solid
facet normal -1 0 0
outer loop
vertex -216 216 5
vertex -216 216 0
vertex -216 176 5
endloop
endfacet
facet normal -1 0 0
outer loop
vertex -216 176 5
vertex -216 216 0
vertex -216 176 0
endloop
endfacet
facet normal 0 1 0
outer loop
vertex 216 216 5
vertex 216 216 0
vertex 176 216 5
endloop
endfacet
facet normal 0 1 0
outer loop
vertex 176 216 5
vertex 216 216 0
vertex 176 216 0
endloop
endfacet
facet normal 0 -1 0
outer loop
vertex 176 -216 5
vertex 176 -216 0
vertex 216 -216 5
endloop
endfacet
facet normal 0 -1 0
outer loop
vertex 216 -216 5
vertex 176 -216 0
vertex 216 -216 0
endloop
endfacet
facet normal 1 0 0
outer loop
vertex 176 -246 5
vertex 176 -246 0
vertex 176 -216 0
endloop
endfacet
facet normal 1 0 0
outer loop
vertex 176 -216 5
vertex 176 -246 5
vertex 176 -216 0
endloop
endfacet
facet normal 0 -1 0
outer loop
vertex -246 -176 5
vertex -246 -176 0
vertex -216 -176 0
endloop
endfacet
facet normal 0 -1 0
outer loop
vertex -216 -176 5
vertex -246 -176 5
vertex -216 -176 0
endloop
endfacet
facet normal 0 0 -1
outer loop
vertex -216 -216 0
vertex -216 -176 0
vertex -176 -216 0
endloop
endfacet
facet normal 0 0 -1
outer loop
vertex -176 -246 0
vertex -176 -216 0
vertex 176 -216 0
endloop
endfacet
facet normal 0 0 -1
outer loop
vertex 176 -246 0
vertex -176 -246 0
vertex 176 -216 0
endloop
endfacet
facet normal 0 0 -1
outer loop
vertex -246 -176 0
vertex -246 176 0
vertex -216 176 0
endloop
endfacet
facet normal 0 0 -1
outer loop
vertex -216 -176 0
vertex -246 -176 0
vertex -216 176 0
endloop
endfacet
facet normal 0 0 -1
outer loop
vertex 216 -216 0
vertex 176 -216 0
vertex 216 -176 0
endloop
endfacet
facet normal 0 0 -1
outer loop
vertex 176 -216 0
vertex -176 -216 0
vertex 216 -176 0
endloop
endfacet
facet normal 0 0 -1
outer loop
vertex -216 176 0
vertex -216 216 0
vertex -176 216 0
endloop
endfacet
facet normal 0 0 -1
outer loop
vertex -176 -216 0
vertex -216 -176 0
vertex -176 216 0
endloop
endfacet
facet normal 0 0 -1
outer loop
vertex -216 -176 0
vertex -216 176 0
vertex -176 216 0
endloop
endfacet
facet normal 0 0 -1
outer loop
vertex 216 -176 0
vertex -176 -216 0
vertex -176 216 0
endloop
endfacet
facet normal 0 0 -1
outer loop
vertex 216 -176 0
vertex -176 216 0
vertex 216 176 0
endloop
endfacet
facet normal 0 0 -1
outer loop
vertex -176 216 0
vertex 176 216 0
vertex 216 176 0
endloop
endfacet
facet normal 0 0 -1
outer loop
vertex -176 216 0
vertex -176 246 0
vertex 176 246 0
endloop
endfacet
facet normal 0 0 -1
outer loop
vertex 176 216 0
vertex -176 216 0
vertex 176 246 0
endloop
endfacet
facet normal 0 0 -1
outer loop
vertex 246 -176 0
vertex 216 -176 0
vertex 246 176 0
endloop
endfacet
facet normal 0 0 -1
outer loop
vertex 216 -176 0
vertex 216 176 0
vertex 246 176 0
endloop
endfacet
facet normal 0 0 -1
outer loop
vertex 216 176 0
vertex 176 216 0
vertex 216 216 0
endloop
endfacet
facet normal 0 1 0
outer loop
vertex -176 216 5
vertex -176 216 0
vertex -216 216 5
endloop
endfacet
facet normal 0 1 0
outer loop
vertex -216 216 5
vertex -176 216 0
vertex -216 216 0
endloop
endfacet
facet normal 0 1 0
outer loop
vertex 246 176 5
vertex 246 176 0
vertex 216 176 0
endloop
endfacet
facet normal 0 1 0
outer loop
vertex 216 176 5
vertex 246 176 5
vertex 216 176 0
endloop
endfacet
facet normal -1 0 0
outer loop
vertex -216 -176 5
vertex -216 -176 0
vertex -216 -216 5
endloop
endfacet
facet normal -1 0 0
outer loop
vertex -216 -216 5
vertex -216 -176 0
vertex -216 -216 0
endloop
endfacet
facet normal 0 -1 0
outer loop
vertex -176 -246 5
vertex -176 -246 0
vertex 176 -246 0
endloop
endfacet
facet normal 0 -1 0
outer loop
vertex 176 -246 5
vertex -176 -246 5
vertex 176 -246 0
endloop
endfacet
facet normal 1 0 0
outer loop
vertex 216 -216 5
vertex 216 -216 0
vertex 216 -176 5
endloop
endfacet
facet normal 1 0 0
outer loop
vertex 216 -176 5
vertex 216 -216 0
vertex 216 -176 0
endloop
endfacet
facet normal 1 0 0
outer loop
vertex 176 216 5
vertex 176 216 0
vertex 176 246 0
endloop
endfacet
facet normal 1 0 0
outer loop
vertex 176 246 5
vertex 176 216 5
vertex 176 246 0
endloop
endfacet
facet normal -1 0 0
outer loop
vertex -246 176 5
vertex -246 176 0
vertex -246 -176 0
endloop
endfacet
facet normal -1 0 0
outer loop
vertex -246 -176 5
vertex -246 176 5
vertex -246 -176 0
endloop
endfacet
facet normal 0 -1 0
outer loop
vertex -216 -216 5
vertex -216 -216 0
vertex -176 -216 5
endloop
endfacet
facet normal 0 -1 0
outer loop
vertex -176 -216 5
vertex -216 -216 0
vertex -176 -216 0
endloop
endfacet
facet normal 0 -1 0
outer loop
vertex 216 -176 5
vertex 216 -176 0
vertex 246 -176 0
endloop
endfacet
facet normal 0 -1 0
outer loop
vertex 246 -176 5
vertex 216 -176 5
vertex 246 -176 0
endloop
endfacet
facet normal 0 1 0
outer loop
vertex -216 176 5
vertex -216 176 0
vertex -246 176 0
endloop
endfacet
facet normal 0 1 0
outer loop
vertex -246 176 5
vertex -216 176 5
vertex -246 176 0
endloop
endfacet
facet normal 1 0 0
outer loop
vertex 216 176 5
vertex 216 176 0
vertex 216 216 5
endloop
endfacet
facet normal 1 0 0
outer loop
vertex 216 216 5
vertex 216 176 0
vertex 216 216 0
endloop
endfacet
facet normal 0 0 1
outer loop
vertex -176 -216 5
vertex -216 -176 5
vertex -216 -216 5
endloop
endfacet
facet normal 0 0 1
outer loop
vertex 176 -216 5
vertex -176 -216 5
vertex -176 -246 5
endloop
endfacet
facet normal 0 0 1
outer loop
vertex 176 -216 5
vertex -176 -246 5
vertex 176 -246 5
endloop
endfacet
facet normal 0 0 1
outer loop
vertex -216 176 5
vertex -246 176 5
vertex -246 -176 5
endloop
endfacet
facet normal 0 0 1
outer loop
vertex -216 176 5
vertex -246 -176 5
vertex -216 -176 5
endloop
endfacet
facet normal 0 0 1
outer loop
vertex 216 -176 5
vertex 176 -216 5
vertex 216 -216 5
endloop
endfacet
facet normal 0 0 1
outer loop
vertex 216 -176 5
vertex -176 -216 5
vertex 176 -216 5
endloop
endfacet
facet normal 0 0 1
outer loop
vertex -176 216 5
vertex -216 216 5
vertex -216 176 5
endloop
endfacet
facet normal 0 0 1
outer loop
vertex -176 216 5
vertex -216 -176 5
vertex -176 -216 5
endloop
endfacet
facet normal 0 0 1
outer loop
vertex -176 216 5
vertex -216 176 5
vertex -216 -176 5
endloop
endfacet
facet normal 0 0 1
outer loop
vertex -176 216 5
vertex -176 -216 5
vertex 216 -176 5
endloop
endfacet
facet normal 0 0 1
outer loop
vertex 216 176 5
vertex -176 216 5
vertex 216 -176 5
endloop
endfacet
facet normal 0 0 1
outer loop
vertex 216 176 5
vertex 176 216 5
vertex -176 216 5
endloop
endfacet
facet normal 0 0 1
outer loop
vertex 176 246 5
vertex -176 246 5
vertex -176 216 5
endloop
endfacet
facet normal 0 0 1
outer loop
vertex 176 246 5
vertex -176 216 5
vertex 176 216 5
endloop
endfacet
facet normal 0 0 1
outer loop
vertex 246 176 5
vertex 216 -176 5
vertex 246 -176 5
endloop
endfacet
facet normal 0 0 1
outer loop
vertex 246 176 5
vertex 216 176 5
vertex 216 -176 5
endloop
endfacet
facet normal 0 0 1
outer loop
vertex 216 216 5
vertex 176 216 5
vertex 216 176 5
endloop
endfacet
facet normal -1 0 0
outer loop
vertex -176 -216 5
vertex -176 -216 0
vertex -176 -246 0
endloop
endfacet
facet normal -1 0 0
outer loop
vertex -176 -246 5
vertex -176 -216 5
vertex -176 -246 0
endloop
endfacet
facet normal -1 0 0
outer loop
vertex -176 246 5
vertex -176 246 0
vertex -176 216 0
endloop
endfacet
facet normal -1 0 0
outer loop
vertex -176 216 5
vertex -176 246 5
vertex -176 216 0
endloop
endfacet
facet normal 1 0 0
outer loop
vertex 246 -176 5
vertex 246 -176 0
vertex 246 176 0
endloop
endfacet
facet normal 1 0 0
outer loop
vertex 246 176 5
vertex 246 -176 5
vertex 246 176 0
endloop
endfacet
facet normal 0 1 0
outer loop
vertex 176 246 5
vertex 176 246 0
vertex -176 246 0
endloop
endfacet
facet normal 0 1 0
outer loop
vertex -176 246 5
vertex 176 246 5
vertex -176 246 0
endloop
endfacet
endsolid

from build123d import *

# Parameters (mm, degrees)
SALIENTE_EXTRUIR1_DEPTH = 5


with BuildPart() as part:
    # Croquis1 → Saliente-Extruir1 (new body)
    with BuildSketch(Plane.XY):
        Polygon((0, 246), (0, 0), (246, 0), (246, 176), (216, 176), (216, 216), (176, 216), (176, 246), align=None)
        Polygon((-246, 176), (-246, 0), (0, 0), (0, 246), (-176, 246), (-176, 216), (-216, 216), (-216, 176), align=None)
        Polygon((0, 0), (-246, 0), (-246, -176), (-216, -176), (-216, -216), (-176, -216), (-176, -246), (176, -246), (176, -216), (216, -216), (216, -176), (246, -176), (246, 0), align=None)
    extrude(amount=SALIENTE_EXTRUIR1_DEPTH)


solid = part.part
